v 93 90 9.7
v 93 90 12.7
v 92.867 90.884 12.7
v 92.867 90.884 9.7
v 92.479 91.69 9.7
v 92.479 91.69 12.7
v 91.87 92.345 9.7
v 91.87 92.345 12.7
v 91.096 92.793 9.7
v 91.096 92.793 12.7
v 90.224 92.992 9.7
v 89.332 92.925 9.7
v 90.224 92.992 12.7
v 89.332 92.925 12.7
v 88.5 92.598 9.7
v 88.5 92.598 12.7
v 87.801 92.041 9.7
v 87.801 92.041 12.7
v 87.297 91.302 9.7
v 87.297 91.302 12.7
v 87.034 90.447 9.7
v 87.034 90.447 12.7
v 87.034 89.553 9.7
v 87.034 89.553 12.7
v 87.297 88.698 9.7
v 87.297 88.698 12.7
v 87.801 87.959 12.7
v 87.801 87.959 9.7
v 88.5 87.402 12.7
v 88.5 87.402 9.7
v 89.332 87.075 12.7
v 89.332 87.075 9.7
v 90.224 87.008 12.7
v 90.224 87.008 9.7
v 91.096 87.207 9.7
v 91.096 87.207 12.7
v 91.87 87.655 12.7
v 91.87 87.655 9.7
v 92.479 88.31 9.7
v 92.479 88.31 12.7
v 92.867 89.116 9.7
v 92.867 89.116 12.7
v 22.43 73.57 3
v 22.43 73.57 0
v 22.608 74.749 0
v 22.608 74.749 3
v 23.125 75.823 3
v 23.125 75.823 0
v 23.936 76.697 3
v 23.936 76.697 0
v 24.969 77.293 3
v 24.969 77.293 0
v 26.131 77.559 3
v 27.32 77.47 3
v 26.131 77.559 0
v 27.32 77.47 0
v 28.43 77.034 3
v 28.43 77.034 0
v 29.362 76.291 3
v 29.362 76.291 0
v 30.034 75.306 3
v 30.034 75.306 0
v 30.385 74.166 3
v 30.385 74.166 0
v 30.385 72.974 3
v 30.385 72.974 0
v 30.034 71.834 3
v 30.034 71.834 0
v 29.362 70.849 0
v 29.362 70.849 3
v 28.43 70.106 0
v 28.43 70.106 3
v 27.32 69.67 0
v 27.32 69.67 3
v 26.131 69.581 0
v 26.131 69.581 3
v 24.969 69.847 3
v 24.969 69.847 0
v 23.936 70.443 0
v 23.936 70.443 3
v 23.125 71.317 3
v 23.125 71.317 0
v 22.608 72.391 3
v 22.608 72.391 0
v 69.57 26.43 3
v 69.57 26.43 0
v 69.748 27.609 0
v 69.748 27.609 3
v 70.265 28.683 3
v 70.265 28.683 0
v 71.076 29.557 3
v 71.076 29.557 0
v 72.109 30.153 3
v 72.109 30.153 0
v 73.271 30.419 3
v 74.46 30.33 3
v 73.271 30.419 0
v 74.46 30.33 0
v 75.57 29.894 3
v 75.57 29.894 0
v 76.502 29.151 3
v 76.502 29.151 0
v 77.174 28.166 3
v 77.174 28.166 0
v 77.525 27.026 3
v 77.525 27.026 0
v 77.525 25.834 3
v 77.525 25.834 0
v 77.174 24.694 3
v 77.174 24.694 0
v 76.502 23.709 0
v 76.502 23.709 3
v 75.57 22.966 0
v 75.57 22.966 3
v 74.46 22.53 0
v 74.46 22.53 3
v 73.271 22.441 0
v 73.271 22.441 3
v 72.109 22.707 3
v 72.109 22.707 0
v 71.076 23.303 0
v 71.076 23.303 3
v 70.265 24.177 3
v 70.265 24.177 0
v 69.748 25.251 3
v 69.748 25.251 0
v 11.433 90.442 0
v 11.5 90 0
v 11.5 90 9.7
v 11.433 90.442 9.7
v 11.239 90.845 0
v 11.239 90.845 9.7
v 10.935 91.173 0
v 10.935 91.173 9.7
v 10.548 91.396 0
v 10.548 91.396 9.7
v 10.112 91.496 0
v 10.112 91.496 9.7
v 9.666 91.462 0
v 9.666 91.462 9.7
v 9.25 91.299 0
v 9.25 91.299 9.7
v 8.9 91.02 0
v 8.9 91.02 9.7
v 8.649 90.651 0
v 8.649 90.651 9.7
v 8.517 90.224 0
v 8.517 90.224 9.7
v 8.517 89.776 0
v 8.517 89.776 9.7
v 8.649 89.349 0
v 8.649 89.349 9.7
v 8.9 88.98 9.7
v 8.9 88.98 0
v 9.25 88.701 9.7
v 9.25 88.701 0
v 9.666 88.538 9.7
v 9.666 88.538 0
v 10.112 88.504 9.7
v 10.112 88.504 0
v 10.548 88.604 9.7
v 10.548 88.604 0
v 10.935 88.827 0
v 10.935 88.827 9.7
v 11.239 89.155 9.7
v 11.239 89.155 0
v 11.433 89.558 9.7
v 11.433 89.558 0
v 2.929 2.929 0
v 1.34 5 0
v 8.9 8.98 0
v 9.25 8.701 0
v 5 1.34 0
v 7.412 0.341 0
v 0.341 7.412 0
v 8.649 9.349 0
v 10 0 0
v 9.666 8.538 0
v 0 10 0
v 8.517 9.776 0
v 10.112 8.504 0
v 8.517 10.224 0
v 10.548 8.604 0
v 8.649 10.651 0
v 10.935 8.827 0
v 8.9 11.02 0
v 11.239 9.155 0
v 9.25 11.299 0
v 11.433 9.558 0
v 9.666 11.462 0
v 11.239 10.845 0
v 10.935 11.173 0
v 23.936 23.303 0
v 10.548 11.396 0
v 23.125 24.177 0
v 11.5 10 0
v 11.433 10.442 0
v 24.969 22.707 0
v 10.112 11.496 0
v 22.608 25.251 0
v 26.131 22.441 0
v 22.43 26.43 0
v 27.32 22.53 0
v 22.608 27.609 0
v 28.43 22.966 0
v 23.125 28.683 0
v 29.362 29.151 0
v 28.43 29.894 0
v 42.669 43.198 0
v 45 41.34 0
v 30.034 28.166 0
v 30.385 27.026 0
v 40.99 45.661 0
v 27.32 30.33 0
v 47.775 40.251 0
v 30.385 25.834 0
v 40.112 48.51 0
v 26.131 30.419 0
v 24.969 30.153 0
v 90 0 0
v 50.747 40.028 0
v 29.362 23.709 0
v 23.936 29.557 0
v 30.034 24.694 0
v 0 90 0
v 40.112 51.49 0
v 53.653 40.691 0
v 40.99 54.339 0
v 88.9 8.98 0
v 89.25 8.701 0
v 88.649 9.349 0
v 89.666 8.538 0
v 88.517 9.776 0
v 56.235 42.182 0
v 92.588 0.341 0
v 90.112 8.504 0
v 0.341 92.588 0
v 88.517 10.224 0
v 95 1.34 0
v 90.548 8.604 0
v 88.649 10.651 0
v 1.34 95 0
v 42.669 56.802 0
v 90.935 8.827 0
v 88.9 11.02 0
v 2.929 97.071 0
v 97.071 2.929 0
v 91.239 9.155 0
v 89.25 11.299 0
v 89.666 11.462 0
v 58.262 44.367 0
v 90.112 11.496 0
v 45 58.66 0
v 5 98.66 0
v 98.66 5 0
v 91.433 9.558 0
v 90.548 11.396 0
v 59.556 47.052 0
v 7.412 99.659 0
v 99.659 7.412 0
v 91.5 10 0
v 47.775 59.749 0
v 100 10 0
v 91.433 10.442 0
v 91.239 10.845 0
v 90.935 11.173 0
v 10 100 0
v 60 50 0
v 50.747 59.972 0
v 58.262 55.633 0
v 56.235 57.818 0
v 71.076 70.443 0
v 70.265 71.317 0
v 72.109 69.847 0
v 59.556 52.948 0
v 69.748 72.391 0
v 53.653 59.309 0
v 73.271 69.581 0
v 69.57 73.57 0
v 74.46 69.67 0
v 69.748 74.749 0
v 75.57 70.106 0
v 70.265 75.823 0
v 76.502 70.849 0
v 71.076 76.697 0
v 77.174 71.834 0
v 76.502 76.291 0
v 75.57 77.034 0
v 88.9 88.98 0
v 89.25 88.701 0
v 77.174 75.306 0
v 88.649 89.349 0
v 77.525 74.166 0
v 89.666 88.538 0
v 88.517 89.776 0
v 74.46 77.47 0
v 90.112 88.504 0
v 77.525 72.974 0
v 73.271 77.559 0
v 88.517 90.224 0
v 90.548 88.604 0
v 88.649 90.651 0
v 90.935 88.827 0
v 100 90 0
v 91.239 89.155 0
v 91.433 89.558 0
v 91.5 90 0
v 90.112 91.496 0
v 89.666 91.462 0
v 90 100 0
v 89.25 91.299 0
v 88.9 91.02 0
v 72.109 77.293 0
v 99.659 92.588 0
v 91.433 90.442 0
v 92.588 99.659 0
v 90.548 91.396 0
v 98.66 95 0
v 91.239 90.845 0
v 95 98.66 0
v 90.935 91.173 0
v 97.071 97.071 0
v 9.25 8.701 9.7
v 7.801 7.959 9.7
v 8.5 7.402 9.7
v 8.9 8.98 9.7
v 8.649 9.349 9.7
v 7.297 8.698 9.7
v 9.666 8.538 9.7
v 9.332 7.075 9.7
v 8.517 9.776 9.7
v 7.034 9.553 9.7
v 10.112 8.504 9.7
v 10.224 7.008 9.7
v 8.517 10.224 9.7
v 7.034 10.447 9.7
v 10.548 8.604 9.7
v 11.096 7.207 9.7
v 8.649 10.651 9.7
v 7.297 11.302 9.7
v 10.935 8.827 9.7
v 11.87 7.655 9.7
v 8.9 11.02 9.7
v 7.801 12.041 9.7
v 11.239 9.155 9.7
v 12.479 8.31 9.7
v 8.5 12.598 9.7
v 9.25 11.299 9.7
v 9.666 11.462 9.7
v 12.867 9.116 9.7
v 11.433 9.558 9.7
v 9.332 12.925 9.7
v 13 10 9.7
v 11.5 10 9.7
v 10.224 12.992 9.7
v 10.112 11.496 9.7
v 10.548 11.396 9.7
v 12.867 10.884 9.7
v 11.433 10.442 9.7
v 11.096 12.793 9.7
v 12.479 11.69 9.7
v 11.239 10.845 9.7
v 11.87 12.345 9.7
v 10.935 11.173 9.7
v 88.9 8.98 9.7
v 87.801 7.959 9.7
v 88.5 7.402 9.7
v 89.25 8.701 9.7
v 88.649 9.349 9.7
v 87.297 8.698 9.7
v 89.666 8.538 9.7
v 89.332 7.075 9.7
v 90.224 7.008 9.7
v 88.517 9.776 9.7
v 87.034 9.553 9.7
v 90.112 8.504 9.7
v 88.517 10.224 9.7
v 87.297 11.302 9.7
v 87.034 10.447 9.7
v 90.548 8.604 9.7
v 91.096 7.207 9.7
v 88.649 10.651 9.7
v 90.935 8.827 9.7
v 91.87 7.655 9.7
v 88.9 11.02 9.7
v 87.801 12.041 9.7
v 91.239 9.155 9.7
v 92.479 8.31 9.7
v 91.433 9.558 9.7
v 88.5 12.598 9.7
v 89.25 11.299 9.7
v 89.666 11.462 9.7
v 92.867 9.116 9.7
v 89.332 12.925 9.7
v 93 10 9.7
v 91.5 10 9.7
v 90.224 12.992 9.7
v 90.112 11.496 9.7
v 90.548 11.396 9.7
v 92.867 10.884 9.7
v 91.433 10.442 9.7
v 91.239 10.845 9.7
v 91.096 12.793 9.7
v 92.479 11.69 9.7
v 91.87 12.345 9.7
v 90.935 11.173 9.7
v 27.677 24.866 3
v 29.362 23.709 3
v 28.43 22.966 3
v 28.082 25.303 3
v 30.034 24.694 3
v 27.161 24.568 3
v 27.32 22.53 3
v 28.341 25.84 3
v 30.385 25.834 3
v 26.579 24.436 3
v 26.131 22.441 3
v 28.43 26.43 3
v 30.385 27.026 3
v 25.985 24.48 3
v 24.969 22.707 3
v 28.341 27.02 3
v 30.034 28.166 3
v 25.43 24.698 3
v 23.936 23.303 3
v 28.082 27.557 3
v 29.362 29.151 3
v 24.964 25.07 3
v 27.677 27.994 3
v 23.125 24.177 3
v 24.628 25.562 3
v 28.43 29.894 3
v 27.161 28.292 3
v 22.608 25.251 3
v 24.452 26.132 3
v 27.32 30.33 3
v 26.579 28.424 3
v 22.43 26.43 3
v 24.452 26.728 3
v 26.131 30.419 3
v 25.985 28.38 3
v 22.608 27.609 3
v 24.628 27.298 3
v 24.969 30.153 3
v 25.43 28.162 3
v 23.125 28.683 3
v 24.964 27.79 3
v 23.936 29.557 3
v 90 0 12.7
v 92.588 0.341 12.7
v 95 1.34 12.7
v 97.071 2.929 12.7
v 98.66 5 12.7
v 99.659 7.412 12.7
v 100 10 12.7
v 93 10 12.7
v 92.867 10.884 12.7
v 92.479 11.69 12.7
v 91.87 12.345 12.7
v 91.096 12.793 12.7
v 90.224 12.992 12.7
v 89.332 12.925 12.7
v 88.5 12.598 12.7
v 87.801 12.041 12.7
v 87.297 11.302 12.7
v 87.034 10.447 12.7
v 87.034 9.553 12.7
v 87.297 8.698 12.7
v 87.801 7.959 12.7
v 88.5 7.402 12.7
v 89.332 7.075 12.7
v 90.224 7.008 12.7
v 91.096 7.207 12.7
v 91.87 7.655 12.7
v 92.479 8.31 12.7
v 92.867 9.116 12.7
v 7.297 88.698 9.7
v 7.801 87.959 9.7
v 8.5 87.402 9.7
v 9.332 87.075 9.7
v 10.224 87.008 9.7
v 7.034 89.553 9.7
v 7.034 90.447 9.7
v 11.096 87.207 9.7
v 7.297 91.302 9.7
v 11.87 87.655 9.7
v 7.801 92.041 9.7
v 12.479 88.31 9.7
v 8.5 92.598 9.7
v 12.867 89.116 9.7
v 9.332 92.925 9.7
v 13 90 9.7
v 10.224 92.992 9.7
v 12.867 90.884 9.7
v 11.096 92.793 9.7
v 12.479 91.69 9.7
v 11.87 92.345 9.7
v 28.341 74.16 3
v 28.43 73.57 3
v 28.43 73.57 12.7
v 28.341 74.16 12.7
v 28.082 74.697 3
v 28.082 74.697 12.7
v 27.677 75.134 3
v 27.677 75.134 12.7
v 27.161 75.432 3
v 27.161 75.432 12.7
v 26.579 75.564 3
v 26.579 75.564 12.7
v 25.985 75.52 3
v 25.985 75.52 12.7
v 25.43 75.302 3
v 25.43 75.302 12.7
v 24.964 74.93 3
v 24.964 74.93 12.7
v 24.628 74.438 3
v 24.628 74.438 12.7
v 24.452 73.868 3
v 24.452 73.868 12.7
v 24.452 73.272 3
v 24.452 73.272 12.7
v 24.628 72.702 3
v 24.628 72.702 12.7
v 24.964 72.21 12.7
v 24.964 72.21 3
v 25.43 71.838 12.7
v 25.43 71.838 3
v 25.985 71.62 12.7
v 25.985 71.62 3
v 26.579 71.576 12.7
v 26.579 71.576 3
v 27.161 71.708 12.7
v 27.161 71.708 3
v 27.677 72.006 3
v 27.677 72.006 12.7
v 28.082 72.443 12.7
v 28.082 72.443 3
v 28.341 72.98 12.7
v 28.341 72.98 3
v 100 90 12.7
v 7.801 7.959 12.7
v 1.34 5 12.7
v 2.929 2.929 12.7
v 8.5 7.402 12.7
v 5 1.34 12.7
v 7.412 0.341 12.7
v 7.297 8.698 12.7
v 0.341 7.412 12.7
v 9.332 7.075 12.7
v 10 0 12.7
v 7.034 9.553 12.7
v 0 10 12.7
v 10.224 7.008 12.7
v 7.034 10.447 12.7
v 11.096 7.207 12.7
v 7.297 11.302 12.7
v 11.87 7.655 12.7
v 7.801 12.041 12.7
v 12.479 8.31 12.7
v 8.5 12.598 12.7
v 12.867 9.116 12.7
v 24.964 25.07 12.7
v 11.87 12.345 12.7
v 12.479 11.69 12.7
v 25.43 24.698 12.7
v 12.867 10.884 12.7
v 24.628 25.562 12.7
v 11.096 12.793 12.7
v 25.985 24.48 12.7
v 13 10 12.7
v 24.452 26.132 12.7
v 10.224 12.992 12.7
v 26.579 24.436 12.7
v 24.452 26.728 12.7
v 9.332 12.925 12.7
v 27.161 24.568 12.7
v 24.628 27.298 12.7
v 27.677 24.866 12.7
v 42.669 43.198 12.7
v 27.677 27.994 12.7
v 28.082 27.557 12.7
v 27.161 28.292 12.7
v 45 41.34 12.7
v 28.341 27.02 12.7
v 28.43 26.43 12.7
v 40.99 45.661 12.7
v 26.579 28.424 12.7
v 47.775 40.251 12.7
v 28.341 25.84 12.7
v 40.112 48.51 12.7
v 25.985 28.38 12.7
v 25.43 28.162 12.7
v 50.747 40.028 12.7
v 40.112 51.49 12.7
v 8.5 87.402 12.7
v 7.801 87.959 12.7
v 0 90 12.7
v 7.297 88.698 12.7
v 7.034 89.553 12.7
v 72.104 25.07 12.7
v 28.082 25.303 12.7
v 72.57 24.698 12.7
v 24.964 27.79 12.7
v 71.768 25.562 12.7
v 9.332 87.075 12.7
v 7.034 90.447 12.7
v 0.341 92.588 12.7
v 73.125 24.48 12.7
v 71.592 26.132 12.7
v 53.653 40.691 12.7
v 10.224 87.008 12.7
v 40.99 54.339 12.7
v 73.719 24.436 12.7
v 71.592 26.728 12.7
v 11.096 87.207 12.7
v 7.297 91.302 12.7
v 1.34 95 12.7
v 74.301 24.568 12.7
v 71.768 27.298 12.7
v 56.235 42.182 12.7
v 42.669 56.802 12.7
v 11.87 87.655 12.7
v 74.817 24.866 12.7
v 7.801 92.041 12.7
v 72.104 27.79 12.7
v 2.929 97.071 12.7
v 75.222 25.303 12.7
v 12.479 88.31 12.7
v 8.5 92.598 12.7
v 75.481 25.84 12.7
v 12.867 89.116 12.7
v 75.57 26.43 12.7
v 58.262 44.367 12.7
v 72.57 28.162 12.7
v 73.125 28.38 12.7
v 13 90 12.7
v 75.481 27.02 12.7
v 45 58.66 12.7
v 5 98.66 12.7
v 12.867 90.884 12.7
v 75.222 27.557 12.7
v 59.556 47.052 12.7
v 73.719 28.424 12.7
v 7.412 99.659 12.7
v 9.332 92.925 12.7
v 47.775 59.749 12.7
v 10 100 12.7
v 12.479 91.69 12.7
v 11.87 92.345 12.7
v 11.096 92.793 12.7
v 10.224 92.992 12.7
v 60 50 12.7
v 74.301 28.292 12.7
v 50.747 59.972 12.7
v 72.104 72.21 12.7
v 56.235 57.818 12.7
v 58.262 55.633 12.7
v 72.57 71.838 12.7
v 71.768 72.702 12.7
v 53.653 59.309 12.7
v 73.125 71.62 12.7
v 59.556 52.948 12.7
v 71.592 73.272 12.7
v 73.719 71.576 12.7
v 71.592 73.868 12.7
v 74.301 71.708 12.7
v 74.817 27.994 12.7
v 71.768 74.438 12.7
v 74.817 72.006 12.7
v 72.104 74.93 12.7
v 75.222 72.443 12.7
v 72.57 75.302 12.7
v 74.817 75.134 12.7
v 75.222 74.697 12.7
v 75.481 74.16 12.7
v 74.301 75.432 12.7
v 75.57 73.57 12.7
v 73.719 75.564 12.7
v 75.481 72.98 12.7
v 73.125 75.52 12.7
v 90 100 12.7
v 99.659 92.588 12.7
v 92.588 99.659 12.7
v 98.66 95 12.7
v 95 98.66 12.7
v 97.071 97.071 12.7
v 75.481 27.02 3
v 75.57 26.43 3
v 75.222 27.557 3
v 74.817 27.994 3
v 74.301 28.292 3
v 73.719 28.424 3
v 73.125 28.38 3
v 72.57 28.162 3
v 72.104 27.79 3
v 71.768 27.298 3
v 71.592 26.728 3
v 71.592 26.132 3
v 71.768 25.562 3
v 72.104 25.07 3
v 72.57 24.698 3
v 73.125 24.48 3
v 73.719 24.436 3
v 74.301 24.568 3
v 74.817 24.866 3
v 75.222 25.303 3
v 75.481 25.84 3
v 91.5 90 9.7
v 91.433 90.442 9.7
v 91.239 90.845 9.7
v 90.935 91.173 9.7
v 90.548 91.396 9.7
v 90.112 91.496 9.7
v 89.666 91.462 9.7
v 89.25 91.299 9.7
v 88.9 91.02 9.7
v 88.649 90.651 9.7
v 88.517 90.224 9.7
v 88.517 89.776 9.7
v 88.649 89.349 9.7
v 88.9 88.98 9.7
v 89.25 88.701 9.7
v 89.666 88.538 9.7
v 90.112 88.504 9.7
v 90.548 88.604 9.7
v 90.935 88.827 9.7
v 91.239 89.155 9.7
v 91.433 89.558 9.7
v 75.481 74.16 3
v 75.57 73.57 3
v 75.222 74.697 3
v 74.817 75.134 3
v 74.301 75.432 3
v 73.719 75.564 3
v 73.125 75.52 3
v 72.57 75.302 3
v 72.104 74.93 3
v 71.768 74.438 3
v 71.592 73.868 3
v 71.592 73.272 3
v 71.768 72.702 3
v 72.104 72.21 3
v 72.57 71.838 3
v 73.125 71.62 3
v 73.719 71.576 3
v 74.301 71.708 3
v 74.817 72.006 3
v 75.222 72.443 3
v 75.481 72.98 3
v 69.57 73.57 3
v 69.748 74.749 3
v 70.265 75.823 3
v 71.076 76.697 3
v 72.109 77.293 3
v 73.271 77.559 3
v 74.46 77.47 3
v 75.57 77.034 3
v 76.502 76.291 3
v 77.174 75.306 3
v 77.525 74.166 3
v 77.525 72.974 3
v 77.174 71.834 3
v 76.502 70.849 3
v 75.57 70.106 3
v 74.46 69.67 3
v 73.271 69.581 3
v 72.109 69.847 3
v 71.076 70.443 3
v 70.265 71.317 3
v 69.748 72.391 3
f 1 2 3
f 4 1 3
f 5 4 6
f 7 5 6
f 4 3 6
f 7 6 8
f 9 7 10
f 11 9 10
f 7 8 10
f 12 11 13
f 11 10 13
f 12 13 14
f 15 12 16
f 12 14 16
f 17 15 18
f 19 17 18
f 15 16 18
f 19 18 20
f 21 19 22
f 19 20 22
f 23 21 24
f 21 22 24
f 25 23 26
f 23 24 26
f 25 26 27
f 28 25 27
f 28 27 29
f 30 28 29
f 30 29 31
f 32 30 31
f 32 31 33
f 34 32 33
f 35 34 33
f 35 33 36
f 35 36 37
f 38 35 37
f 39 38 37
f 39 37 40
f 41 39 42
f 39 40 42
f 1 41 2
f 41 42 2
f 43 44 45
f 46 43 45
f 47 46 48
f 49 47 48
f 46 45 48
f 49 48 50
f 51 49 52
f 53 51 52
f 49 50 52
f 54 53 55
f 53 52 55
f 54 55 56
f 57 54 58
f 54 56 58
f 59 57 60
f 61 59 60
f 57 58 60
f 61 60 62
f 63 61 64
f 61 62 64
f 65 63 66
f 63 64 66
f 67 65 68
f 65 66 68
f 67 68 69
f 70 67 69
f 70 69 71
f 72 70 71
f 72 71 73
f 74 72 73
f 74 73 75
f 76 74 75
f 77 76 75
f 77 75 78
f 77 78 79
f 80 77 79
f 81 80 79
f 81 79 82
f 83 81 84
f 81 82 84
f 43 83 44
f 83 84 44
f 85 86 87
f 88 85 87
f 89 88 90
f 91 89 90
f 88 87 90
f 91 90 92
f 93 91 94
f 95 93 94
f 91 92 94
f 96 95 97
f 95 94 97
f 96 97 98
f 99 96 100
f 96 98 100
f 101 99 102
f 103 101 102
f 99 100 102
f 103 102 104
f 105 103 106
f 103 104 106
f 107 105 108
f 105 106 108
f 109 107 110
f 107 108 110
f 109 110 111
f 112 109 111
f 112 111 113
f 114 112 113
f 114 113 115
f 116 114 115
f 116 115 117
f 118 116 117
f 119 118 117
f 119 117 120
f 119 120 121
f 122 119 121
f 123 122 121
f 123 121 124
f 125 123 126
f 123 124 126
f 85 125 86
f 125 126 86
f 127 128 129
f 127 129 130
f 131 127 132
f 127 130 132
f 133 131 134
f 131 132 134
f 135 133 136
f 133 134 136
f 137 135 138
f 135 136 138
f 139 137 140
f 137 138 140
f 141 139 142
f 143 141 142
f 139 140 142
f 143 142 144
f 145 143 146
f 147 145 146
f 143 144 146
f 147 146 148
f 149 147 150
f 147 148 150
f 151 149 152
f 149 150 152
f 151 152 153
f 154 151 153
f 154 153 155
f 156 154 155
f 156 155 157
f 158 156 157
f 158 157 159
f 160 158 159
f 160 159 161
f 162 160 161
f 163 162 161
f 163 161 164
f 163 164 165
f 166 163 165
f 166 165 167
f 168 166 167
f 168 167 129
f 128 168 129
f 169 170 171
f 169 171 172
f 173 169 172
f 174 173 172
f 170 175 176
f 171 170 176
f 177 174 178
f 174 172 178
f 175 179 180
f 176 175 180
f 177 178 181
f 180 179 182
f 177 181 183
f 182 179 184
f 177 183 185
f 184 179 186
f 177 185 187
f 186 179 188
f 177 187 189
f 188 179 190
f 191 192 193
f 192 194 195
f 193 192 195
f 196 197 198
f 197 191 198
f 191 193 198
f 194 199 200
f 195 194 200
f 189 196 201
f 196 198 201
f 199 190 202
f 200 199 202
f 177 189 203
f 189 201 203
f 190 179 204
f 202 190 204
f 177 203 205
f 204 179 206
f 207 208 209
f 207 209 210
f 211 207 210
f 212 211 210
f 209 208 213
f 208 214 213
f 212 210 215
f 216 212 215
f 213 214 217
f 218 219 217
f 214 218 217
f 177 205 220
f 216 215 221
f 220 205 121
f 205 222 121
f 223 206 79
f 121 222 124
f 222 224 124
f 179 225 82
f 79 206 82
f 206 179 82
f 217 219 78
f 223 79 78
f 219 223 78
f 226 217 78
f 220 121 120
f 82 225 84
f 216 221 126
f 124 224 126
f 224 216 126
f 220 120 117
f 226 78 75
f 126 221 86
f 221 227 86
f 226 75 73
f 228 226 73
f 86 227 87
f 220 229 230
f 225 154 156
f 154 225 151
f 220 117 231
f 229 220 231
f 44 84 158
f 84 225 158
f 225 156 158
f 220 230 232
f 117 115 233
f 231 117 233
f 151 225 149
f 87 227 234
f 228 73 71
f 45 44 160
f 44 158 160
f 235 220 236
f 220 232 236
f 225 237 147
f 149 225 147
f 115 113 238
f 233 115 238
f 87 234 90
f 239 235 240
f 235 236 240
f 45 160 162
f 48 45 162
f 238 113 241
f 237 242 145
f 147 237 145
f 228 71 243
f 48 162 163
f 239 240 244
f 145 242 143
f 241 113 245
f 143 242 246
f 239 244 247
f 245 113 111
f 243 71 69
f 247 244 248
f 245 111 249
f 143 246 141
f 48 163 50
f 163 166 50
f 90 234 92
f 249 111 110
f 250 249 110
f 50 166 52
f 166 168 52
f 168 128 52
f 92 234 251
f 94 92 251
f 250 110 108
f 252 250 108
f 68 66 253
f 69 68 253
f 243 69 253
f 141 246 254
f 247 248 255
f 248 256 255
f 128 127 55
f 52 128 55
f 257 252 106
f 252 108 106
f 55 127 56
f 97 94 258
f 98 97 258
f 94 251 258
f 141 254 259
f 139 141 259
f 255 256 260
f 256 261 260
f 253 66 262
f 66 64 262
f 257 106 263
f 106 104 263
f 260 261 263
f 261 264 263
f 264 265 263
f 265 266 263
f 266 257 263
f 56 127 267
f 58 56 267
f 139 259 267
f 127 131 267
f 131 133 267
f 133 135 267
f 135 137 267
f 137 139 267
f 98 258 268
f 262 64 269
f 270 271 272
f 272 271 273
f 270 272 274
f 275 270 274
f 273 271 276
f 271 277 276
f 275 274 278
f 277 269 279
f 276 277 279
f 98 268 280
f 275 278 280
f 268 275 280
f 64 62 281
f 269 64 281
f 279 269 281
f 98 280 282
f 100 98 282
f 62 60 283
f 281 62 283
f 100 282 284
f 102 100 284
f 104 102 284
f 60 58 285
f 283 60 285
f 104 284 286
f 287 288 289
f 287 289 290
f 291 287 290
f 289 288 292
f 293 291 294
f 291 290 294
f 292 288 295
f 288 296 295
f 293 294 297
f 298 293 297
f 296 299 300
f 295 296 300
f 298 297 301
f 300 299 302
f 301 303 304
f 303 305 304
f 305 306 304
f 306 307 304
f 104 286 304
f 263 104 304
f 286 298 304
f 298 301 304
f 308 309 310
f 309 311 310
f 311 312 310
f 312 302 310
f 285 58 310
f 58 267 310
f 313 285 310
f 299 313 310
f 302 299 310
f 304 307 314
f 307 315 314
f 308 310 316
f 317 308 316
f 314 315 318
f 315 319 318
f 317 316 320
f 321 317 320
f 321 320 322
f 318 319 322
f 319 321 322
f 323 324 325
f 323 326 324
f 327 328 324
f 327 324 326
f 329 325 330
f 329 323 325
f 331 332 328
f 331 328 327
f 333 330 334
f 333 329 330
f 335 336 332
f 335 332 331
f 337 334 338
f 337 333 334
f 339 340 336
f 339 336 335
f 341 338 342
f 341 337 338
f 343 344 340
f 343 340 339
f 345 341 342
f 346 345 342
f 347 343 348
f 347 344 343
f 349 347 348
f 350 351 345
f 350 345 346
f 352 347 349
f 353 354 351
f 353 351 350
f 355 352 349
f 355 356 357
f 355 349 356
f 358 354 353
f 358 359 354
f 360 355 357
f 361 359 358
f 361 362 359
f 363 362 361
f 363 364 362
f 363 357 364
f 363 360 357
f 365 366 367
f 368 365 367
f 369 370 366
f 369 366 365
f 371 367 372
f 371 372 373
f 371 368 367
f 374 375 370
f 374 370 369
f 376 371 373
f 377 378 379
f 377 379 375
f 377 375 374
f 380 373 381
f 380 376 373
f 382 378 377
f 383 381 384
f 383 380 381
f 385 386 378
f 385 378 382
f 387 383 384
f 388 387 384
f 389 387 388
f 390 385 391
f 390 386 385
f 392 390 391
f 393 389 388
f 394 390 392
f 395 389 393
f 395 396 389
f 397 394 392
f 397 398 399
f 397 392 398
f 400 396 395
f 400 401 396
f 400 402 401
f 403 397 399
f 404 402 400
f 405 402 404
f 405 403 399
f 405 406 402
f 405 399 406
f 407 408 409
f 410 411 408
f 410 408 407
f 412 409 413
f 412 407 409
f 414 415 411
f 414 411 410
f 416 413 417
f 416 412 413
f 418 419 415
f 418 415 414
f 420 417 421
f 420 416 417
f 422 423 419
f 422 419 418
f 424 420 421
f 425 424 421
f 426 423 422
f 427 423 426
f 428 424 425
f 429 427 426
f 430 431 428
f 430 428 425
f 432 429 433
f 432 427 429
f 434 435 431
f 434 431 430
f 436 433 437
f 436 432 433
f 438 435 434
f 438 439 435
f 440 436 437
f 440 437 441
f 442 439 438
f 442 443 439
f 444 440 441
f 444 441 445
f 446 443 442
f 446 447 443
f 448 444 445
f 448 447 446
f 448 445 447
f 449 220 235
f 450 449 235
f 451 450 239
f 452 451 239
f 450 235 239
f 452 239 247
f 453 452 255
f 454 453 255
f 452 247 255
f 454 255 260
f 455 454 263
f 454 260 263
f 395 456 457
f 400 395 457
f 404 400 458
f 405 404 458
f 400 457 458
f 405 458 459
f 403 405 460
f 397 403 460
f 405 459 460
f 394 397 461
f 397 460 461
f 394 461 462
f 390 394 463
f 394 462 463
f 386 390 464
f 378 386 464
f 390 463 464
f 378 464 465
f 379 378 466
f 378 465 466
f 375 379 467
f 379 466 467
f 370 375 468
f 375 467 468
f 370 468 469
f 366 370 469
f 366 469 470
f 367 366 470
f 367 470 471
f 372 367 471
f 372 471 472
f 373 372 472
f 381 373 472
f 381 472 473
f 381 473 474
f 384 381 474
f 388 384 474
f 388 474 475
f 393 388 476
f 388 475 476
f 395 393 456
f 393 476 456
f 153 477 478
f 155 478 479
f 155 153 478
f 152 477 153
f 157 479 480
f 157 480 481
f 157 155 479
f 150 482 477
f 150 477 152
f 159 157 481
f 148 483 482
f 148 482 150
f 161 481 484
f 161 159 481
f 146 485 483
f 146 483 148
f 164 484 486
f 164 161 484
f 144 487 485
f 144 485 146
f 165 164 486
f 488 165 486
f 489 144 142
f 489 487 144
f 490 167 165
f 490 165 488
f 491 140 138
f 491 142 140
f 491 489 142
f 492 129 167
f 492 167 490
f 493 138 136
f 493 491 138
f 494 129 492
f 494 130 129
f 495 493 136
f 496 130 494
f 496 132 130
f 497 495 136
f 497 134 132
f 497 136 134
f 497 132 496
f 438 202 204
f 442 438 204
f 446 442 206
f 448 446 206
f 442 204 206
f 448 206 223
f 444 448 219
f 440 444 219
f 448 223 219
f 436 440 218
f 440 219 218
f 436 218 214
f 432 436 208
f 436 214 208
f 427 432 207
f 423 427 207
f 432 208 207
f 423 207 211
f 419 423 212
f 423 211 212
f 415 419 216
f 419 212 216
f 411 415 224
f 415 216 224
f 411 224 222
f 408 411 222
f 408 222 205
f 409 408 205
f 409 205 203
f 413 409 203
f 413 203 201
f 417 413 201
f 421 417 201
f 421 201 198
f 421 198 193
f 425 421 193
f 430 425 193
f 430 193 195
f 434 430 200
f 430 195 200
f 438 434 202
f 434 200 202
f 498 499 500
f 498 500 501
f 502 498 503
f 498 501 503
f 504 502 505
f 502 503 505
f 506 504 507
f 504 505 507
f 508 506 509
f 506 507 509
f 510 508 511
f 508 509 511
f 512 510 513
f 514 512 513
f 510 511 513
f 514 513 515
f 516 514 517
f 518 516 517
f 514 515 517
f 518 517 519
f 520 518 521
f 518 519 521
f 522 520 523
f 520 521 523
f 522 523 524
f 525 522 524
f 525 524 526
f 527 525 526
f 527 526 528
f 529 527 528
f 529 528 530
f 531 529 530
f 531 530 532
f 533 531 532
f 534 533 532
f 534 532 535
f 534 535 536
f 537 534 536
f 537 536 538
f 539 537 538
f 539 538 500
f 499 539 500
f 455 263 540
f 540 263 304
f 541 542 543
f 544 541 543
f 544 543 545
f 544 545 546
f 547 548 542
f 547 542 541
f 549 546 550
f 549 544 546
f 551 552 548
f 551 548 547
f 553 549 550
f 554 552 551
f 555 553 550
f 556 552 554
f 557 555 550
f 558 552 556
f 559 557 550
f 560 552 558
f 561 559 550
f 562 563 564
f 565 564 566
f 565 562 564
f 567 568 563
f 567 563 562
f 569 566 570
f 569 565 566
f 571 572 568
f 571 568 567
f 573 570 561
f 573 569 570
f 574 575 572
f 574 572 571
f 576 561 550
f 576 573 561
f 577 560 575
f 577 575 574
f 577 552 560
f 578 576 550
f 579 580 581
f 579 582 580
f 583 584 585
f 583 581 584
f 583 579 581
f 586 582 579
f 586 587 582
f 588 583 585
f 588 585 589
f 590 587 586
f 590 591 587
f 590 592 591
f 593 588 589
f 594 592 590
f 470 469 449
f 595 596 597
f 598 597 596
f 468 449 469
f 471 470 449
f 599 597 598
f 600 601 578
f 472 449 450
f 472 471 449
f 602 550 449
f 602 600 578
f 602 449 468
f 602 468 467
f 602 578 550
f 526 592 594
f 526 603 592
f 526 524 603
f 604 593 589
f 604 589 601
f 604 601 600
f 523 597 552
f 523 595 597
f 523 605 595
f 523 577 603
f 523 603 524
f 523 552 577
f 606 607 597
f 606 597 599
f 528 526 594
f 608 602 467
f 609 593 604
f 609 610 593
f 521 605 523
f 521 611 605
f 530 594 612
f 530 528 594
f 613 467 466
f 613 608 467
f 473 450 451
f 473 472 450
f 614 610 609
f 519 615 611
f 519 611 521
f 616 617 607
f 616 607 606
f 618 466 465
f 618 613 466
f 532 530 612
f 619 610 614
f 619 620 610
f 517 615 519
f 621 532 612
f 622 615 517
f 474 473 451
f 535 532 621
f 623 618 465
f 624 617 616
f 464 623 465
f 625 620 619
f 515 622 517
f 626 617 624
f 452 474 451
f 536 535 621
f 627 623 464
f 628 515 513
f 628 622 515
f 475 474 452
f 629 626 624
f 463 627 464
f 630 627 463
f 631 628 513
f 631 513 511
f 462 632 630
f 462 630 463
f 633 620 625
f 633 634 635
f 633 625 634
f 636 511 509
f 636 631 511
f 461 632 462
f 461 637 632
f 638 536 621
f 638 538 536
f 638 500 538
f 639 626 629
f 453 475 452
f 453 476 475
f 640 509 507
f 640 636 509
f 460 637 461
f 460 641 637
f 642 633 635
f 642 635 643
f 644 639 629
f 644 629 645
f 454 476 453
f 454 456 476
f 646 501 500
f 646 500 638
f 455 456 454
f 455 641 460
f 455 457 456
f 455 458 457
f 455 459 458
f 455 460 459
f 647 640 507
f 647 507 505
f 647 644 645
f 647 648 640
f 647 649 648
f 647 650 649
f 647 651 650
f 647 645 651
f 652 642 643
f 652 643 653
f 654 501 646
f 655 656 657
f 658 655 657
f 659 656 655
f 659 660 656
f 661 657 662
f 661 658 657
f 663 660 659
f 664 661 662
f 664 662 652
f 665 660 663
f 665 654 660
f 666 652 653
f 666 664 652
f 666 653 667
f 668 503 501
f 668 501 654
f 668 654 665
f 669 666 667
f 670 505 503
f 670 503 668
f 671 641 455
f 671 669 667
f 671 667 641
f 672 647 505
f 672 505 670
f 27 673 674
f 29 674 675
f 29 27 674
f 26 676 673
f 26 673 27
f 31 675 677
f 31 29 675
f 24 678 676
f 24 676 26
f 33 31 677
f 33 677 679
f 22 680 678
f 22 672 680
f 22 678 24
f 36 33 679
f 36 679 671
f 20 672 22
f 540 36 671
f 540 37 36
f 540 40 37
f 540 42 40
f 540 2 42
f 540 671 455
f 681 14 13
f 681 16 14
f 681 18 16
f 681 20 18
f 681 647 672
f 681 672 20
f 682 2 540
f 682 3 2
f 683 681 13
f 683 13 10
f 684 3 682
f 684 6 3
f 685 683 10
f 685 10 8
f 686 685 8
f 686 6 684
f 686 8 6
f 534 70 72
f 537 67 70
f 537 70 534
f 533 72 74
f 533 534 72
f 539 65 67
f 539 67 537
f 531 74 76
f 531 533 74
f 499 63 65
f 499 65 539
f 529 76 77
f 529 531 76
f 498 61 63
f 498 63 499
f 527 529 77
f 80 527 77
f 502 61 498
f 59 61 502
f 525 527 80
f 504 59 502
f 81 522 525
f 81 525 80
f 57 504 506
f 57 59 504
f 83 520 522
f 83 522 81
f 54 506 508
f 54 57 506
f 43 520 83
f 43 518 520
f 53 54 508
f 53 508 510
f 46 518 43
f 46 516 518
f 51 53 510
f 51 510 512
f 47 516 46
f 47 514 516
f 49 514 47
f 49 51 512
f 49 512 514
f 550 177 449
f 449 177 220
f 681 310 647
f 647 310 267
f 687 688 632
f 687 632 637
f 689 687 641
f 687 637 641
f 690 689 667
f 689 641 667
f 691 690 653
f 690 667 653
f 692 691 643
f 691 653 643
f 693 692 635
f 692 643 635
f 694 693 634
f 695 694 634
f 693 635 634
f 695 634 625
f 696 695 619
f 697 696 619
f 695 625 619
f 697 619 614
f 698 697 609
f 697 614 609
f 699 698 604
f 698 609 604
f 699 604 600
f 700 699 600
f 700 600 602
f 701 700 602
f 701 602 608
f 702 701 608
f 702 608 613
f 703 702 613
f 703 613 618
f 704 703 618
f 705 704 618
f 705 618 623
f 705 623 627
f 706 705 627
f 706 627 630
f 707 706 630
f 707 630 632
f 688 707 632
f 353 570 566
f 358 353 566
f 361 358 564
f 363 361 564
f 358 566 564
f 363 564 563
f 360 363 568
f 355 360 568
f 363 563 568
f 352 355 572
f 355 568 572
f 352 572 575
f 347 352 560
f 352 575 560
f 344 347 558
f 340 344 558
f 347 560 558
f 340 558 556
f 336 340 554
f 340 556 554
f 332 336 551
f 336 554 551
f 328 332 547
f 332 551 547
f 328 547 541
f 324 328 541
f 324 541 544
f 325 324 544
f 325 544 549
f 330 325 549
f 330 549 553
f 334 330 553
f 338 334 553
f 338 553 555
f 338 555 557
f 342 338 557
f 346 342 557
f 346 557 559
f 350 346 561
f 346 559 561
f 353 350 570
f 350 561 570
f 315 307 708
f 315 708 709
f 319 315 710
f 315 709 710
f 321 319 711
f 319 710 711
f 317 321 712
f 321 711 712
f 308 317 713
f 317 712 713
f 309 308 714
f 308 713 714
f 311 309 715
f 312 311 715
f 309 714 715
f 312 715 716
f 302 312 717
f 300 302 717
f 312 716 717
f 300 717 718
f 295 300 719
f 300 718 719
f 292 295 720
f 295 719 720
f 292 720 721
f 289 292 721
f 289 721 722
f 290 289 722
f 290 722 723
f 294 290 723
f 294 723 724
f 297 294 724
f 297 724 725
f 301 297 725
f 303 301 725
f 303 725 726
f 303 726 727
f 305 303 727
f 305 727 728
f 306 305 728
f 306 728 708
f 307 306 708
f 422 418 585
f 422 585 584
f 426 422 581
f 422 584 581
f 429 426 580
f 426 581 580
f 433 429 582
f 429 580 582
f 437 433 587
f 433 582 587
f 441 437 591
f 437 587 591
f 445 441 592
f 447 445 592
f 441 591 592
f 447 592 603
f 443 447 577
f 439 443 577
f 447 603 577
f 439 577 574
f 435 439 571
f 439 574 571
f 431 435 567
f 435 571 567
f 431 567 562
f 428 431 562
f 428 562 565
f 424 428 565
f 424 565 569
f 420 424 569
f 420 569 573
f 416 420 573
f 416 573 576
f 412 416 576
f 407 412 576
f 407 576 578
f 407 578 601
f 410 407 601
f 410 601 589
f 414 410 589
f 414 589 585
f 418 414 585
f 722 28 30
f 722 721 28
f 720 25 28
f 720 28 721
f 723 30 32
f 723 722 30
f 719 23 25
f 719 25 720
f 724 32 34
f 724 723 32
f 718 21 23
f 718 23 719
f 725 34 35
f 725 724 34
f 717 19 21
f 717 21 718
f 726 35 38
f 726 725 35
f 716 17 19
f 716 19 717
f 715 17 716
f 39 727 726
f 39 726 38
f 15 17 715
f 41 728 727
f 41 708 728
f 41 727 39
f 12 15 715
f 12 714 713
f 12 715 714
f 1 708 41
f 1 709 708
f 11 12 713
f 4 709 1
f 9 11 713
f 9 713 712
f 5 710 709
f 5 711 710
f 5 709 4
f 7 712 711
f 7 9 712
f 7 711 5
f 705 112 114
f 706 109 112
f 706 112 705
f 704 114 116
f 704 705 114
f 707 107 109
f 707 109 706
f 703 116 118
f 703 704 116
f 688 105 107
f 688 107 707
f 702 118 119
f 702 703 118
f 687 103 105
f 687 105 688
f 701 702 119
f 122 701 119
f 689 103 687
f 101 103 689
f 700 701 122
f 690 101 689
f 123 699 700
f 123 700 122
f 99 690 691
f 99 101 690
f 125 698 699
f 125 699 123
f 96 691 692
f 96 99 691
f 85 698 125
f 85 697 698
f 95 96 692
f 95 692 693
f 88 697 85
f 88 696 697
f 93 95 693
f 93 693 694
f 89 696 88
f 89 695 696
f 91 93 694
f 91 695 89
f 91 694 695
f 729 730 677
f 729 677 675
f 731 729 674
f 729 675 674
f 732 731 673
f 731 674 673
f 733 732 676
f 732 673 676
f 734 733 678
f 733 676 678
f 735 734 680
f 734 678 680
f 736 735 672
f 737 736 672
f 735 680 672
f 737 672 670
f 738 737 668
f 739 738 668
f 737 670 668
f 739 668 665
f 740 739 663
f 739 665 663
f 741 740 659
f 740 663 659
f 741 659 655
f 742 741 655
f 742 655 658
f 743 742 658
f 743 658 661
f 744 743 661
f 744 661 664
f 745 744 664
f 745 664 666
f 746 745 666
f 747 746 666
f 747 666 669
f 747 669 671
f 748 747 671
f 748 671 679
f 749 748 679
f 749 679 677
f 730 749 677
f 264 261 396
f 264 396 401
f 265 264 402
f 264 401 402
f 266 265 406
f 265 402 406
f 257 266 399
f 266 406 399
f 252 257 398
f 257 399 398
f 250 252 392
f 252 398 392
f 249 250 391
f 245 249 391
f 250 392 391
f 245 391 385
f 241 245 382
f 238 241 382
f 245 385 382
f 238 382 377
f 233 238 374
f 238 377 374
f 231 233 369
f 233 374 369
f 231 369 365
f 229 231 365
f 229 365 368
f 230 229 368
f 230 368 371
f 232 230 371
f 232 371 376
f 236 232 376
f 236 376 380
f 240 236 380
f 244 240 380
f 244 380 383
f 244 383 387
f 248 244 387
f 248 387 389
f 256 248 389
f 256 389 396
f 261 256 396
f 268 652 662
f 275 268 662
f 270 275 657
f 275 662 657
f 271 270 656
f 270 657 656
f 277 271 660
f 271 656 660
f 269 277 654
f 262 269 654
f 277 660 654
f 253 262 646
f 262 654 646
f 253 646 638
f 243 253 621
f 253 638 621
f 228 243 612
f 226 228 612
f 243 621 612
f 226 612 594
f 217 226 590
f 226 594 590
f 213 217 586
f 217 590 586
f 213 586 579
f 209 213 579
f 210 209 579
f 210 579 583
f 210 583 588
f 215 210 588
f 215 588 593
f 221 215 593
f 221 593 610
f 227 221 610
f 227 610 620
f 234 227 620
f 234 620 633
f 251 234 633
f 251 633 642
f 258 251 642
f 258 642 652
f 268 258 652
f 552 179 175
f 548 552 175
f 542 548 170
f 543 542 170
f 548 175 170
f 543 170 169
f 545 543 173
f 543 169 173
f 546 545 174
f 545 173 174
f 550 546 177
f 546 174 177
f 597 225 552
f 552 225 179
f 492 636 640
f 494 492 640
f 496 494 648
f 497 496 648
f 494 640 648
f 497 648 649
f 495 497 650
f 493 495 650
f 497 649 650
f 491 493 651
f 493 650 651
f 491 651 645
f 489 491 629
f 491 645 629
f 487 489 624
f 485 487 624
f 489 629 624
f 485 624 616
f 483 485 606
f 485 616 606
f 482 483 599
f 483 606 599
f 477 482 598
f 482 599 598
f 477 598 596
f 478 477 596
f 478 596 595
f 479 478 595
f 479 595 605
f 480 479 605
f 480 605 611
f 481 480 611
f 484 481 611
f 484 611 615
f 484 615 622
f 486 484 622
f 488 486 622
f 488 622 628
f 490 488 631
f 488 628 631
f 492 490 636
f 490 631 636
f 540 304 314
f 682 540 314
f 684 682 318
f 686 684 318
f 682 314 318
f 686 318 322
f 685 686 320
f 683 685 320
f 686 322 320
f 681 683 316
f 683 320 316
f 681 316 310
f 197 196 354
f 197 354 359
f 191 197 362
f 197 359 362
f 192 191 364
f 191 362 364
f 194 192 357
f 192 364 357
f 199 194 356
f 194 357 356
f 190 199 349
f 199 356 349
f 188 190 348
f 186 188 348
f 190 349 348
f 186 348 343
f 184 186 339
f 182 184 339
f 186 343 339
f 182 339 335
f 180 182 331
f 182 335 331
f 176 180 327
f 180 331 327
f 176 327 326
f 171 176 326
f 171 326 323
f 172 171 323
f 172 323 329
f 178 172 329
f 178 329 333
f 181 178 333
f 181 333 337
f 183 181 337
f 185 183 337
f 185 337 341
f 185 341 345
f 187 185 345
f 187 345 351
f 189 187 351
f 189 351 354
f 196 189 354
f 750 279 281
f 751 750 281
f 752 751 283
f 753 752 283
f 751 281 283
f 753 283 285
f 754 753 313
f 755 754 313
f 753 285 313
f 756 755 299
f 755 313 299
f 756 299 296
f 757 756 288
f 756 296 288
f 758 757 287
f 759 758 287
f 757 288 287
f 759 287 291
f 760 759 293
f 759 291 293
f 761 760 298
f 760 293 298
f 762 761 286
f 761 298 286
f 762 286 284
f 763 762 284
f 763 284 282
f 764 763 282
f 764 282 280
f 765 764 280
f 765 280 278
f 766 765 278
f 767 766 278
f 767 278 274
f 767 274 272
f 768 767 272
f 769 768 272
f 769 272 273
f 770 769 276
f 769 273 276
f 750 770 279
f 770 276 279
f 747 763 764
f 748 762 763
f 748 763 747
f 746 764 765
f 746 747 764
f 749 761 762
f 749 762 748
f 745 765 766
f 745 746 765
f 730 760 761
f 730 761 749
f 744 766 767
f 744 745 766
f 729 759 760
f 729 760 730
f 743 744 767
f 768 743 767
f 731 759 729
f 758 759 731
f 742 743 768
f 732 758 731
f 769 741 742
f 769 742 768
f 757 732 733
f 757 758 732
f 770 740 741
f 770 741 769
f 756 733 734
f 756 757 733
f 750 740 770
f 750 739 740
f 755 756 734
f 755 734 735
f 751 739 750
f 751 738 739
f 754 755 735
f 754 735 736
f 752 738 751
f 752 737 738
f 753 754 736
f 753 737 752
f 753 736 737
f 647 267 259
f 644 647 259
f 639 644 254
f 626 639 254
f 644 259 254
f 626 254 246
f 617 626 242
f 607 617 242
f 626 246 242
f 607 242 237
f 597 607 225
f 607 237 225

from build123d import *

# Parameters (mm, degrees)
SALIENTE_EXTRUIR1_DEPTH = 12.7
CROQUIS2_R              = 3
CORTAR_EXTRUIR1_DEPTH   = 3
CROQUIS3_R              = 10
CROQUIS3_R_2            = 2
CORTAR_EXTRUIR2_DEPTH   = 31
CROQUIS4_R              = 1.5
CORTAR_EXTRUIR3_DEPTH   = 31
CROQUIS5_R              = 4
CORTAR_EXTRUIR4_DEPTH   = 3


with BuildPart() as part:
    # Croquis1 → Saliente-Extruir1 (new body)
    with BuildSketch(Plane.XY):
        with BuildLine():
            Line((10, 0), (90, 0))
            ThreePointArc((90, 0), (97.071067812, 2.928932188), (100, 10))
            Line((100, 10), (100, 90))
            ThreePointArc((100, 90), (97.071067812, 97.071067812), (90, 100))
            Line((90, 100), (10, 100))
            ThreePointArc((10, 100), (2.928932188, 97.071067812), (0, 90))
            Line((0, 90), (0, 10))
            ThreePointArc((0, 10), (2.928932188, 2.928932188), (10, 0))
        make_face()
    extrude(amount=SALIENTE_EXTRUIR1_DEPTH)

    # Croquis2 → Cortar-Extruir1 (cut)
    with BuildSketch(Plane.XY.offset(12.7)):
        with Locations((10, 90)):
            Circle(CROQUIS2_R)
        with Locations((10, 10)):
            Circle(CROQUIS2_R)
        with Locations((90, 90)):
            Circle(CROQUIS2_R)
        with Locations((90, 10)):
            Circle(CROQUIS2_R)
    extrude(amount=-CORTAR_EXTRUIR1_DEPTH, mode=Mode.SUBTRACT)

    # Croquis3 → Cortar-Extruir2 (cut)
    with BuildSketch(Plane.XY.offset(12.7)):
        with Locations((50, 50)):
            Circle(CROQUIS3_R)
        with Locations((26.43, 73.57)):
            Circle(CROQUIS3_R_2)
        with Locations((73.57, 73.57)):
            Circle(CROQUIS3_R_2)
        with Locations((26.43, 26.43)):
            Circle(CROQUIS3_R_2)
        with Locations((73.57, 26.43)):
            Circle(CROQUIS3_R_2)
    extrude(amount=-CORTAR_EXTRUIR2_DEPTH, mode=Mode.SUBTRACT)

    # Croquis4 → Cortar-Extruir3 (cut)
    with BuildSketch(Plane.XY.offset(9.7)):
        with Locations((10, 90)):
            Circle(CROQUIS4_R)
        with Locations((90, 90)):
            Circle(CROQUIS4_R)
        with Locations((90, 10)):
            Circle(CROQUIS4_R)
        with Locations((10, 10)):
            Circle(CROQUIS4_R)
    extrude(amount=-CORTAR_EXTRUIR3_DEPTH, mode=Mode.SUBTRACT)

    # Croquis5 → Cortar-Extruir4 (cut)
    with BuildSketch(Plane(origin=(0, 0, 0), x_dir=(-1, 0, 0), z_dir=(0, 0, -1))):
        with Locations((-73.57, 73.57)):
            Circle(CROQUIS5_R)
        with Locations((-26.43, 73.57)):
            Circle(CROQUIS5_R)
        with Locations((-26.43, 26.43)):
            Circle(CROQUIS5_R)
        with Locations((-73.57, 26.43)):
            Circle(CROQUIS5_R)
    extrude(amount=-CORTAR_EXTRUIR4_DEPTH, mode=Mode.SUBTRACT)


solid = part.part
